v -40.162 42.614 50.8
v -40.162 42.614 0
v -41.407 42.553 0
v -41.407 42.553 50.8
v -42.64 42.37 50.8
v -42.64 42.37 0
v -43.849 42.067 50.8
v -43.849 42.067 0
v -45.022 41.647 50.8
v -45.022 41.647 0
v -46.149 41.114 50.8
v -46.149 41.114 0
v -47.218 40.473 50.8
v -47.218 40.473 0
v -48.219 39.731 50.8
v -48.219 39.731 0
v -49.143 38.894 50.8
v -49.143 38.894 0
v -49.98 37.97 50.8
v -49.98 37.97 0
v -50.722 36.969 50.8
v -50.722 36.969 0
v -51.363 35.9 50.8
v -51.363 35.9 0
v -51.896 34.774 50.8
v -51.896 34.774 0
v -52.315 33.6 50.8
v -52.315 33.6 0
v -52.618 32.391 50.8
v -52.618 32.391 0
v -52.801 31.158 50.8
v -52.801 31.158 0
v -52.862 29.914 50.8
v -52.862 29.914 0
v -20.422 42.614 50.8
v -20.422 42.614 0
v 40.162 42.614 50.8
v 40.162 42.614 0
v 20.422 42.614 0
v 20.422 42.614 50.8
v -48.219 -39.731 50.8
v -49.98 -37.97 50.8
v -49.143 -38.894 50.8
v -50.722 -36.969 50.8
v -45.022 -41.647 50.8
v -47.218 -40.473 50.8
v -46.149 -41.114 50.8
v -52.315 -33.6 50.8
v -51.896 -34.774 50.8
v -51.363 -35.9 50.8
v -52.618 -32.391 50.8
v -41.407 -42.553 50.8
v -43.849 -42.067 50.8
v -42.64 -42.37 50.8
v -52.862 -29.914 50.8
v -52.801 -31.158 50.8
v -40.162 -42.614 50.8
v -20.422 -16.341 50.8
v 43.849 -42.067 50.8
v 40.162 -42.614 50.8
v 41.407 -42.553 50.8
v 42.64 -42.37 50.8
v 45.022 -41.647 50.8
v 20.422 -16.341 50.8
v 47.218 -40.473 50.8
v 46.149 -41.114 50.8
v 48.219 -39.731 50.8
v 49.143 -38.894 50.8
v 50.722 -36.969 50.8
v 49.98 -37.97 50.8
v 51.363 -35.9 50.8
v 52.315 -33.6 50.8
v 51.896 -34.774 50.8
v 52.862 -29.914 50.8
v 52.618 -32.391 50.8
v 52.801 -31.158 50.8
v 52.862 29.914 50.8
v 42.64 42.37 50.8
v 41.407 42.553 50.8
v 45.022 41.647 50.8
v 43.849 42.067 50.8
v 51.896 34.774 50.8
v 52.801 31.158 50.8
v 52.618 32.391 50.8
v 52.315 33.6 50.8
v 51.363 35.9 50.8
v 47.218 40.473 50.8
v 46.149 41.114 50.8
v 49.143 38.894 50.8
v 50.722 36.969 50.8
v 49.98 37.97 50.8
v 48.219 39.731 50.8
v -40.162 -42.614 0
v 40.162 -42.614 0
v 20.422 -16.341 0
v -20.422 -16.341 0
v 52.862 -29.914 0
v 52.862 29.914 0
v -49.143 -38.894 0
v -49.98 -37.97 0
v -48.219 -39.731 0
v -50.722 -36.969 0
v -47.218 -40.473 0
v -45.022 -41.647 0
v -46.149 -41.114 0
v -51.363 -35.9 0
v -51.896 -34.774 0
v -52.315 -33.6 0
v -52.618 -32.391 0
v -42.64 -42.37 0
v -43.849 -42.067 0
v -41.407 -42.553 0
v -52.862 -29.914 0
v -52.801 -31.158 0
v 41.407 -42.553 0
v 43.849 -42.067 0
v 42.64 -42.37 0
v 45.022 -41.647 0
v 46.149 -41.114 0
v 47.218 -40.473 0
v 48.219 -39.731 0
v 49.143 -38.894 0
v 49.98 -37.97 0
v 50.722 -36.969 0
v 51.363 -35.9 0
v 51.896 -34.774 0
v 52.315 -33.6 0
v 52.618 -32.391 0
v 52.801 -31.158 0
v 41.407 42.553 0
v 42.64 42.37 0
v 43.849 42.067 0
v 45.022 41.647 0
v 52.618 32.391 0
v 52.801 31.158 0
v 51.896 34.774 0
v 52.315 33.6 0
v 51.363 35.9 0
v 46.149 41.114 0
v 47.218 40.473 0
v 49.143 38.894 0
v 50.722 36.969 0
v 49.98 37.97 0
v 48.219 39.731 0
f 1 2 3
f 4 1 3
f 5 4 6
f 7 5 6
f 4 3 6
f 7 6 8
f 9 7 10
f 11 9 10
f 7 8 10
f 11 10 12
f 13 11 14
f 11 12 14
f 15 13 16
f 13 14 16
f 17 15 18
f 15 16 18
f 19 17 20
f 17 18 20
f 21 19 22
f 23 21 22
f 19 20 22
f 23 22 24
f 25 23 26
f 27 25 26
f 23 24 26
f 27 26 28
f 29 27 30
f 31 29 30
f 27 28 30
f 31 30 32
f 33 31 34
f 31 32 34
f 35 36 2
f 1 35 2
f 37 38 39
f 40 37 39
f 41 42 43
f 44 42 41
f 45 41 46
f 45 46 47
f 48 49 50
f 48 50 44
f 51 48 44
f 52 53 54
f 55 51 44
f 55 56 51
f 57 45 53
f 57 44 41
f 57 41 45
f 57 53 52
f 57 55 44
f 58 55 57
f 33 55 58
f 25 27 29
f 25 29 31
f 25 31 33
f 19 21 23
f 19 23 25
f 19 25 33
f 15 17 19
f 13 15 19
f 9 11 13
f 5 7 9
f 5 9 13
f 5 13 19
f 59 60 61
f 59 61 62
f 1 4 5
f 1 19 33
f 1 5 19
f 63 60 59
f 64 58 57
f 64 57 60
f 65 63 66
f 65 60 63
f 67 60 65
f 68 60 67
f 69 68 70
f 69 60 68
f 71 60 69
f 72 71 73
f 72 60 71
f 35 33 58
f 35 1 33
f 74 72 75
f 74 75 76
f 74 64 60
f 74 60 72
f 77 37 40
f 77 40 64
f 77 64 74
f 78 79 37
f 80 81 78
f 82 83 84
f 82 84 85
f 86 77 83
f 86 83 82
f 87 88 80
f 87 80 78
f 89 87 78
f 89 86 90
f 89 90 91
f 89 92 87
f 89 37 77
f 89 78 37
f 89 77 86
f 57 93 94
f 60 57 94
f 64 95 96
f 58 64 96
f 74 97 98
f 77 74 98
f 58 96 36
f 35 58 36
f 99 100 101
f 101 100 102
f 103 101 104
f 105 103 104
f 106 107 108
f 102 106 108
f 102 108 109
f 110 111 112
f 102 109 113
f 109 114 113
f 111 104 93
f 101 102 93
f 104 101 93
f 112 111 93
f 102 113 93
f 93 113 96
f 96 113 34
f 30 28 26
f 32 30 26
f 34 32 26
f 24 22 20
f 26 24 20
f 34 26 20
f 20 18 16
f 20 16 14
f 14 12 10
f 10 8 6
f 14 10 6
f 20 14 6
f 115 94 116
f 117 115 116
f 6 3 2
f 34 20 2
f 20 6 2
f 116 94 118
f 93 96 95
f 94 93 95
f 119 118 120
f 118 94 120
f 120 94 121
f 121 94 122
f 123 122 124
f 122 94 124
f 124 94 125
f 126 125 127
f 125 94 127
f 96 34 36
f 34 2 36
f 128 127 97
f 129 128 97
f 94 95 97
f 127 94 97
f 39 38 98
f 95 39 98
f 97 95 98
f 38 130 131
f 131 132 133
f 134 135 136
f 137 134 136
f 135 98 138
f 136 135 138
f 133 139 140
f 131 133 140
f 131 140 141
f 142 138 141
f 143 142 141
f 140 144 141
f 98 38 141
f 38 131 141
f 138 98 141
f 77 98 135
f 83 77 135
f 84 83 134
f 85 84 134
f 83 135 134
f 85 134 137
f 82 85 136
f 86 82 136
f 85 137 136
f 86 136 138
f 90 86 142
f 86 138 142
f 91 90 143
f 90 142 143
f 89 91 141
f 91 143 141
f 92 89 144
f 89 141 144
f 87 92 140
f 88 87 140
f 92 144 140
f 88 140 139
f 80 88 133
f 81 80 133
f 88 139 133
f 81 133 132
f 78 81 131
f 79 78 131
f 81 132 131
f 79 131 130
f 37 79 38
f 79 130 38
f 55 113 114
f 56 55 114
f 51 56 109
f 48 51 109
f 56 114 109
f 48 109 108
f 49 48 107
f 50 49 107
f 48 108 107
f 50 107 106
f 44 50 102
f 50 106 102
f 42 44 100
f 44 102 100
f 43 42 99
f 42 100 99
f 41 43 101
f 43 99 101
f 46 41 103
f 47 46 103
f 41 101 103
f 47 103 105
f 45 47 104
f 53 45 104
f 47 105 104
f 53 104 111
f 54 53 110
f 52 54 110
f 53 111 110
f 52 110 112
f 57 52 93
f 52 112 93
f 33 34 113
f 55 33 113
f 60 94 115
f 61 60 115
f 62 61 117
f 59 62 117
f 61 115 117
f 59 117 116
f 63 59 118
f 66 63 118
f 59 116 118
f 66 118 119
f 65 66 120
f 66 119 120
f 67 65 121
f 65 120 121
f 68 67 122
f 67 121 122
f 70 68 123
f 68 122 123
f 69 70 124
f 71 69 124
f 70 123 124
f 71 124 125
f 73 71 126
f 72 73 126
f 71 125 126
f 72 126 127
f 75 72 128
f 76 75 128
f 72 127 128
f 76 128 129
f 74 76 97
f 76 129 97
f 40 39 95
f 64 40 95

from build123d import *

# Parameters (mm, degrees)
F1_DEPTH = 50.8


with BuildPart() as f1:
    # F0 (on Top) → F1 (new body)
    with BuildSketch(Plane.XY):
        with BuildLine():
            Line((-20.421574, 42.61367), (-40.162275, 42.61367))
            ThreePointArc((-40.162275, 42.61367), (-49.142532, 38.893926), (-52.862275, 29.91367))
            Line((-52.862275, 29.91367), (-52.862275, -29.91367))
            ThreePointArc((-52.862275, -29.91367), (-49.142532, -38.893926), (-40.162275, -42.61367))
            Line((-40.162275, -42.61367), (40.162275, -42.61367))
            ThreePointArc((40.162275, -42.61367), (49.142532, -38.893926), (52.862275, -29.91367))
            Line((52.862275, -29.91367), (52.862275, 29.91367))
            ThreePointArc((52.862275, 29.91367), (49.142532, 38.893926), (40.162275, 42.61367))
            Line((40.162275, 42.61367), (20.421574, 42.61367))
            Line((20.421574, 42.61367), (20.421574, -16.341066))
            Line((20.421574, -16.341066), (-20.421574, -16.341066))
            Line((-20.421574, -16.341066), (-20.421574, 42.61367))
        make_face()
    extrude(amount=F1_DEPTH)


solid = f1.part
